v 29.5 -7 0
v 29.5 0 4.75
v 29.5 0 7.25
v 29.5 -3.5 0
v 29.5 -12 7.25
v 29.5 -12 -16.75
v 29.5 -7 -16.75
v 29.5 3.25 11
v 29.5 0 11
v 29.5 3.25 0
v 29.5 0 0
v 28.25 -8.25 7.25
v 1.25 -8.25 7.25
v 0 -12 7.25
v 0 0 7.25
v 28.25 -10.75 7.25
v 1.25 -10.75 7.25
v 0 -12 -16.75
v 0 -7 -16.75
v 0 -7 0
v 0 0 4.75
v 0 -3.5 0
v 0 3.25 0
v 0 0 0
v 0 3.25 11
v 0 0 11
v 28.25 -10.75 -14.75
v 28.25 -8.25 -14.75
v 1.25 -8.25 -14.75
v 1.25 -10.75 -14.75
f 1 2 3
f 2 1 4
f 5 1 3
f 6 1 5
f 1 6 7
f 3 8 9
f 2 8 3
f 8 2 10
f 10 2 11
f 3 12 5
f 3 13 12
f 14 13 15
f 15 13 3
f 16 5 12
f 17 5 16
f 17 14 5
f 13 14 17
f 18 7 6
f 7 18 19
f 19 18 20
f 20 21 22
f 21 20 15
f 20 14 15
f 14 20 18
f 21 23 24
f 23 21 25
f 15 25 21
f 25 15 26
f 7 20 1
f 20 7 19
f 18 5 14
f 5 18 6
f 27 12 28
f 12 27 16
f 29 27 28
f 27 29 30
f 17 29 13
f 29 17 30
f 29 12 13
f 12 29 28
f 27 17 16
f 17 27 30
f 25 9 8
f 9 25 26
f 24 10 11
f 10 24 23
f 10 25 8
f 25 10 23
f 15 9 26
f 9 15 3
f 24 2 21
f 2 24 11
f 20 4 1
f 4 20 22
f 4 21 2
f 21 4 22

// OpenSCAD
cube([29.5,3.25,11]);

PolyPoints = [
  [  0,  0,  0 ],  //0
  [ 29.5,  0,  0 ],  //1
  [ 29.5,  3.75,  0 ],  //2
  [  0,  3.75,  0 ],  //3
  [  0,  0,  7.25 ],  //4
  [ 29.5,  0,  7.25 ],  //5
  [ 29.5,  7.25,  4.75 ],  //6
  [  0,  7.25,  4.75 ], //7
  [ 29.5,  7.25,  7.25 ],  //8
  [  0,  7.25,  7.25 ]]; //9
  
  PolyFaces = [
  [0,1,2,3],  // bottom
  [4,5,1,0],  // front
  [9,8,5,4],  // top
  [8,9,7,6],  //flat back
  [5,8,6,2,1],  // right
  [6,7,3,2],  // back
  [9,4,0,3,7]]; // left

translate([0,-7.25,0]) {
    polyhedron( PolyPoints, PolyFaces );
}


translate([0,-12,-16.75]) {
    difference() {
        cube([29.5,5,24]);
        translate([1.25,1.25,2]) {
            cube([27,2.5,30]);
        }
    }
}
